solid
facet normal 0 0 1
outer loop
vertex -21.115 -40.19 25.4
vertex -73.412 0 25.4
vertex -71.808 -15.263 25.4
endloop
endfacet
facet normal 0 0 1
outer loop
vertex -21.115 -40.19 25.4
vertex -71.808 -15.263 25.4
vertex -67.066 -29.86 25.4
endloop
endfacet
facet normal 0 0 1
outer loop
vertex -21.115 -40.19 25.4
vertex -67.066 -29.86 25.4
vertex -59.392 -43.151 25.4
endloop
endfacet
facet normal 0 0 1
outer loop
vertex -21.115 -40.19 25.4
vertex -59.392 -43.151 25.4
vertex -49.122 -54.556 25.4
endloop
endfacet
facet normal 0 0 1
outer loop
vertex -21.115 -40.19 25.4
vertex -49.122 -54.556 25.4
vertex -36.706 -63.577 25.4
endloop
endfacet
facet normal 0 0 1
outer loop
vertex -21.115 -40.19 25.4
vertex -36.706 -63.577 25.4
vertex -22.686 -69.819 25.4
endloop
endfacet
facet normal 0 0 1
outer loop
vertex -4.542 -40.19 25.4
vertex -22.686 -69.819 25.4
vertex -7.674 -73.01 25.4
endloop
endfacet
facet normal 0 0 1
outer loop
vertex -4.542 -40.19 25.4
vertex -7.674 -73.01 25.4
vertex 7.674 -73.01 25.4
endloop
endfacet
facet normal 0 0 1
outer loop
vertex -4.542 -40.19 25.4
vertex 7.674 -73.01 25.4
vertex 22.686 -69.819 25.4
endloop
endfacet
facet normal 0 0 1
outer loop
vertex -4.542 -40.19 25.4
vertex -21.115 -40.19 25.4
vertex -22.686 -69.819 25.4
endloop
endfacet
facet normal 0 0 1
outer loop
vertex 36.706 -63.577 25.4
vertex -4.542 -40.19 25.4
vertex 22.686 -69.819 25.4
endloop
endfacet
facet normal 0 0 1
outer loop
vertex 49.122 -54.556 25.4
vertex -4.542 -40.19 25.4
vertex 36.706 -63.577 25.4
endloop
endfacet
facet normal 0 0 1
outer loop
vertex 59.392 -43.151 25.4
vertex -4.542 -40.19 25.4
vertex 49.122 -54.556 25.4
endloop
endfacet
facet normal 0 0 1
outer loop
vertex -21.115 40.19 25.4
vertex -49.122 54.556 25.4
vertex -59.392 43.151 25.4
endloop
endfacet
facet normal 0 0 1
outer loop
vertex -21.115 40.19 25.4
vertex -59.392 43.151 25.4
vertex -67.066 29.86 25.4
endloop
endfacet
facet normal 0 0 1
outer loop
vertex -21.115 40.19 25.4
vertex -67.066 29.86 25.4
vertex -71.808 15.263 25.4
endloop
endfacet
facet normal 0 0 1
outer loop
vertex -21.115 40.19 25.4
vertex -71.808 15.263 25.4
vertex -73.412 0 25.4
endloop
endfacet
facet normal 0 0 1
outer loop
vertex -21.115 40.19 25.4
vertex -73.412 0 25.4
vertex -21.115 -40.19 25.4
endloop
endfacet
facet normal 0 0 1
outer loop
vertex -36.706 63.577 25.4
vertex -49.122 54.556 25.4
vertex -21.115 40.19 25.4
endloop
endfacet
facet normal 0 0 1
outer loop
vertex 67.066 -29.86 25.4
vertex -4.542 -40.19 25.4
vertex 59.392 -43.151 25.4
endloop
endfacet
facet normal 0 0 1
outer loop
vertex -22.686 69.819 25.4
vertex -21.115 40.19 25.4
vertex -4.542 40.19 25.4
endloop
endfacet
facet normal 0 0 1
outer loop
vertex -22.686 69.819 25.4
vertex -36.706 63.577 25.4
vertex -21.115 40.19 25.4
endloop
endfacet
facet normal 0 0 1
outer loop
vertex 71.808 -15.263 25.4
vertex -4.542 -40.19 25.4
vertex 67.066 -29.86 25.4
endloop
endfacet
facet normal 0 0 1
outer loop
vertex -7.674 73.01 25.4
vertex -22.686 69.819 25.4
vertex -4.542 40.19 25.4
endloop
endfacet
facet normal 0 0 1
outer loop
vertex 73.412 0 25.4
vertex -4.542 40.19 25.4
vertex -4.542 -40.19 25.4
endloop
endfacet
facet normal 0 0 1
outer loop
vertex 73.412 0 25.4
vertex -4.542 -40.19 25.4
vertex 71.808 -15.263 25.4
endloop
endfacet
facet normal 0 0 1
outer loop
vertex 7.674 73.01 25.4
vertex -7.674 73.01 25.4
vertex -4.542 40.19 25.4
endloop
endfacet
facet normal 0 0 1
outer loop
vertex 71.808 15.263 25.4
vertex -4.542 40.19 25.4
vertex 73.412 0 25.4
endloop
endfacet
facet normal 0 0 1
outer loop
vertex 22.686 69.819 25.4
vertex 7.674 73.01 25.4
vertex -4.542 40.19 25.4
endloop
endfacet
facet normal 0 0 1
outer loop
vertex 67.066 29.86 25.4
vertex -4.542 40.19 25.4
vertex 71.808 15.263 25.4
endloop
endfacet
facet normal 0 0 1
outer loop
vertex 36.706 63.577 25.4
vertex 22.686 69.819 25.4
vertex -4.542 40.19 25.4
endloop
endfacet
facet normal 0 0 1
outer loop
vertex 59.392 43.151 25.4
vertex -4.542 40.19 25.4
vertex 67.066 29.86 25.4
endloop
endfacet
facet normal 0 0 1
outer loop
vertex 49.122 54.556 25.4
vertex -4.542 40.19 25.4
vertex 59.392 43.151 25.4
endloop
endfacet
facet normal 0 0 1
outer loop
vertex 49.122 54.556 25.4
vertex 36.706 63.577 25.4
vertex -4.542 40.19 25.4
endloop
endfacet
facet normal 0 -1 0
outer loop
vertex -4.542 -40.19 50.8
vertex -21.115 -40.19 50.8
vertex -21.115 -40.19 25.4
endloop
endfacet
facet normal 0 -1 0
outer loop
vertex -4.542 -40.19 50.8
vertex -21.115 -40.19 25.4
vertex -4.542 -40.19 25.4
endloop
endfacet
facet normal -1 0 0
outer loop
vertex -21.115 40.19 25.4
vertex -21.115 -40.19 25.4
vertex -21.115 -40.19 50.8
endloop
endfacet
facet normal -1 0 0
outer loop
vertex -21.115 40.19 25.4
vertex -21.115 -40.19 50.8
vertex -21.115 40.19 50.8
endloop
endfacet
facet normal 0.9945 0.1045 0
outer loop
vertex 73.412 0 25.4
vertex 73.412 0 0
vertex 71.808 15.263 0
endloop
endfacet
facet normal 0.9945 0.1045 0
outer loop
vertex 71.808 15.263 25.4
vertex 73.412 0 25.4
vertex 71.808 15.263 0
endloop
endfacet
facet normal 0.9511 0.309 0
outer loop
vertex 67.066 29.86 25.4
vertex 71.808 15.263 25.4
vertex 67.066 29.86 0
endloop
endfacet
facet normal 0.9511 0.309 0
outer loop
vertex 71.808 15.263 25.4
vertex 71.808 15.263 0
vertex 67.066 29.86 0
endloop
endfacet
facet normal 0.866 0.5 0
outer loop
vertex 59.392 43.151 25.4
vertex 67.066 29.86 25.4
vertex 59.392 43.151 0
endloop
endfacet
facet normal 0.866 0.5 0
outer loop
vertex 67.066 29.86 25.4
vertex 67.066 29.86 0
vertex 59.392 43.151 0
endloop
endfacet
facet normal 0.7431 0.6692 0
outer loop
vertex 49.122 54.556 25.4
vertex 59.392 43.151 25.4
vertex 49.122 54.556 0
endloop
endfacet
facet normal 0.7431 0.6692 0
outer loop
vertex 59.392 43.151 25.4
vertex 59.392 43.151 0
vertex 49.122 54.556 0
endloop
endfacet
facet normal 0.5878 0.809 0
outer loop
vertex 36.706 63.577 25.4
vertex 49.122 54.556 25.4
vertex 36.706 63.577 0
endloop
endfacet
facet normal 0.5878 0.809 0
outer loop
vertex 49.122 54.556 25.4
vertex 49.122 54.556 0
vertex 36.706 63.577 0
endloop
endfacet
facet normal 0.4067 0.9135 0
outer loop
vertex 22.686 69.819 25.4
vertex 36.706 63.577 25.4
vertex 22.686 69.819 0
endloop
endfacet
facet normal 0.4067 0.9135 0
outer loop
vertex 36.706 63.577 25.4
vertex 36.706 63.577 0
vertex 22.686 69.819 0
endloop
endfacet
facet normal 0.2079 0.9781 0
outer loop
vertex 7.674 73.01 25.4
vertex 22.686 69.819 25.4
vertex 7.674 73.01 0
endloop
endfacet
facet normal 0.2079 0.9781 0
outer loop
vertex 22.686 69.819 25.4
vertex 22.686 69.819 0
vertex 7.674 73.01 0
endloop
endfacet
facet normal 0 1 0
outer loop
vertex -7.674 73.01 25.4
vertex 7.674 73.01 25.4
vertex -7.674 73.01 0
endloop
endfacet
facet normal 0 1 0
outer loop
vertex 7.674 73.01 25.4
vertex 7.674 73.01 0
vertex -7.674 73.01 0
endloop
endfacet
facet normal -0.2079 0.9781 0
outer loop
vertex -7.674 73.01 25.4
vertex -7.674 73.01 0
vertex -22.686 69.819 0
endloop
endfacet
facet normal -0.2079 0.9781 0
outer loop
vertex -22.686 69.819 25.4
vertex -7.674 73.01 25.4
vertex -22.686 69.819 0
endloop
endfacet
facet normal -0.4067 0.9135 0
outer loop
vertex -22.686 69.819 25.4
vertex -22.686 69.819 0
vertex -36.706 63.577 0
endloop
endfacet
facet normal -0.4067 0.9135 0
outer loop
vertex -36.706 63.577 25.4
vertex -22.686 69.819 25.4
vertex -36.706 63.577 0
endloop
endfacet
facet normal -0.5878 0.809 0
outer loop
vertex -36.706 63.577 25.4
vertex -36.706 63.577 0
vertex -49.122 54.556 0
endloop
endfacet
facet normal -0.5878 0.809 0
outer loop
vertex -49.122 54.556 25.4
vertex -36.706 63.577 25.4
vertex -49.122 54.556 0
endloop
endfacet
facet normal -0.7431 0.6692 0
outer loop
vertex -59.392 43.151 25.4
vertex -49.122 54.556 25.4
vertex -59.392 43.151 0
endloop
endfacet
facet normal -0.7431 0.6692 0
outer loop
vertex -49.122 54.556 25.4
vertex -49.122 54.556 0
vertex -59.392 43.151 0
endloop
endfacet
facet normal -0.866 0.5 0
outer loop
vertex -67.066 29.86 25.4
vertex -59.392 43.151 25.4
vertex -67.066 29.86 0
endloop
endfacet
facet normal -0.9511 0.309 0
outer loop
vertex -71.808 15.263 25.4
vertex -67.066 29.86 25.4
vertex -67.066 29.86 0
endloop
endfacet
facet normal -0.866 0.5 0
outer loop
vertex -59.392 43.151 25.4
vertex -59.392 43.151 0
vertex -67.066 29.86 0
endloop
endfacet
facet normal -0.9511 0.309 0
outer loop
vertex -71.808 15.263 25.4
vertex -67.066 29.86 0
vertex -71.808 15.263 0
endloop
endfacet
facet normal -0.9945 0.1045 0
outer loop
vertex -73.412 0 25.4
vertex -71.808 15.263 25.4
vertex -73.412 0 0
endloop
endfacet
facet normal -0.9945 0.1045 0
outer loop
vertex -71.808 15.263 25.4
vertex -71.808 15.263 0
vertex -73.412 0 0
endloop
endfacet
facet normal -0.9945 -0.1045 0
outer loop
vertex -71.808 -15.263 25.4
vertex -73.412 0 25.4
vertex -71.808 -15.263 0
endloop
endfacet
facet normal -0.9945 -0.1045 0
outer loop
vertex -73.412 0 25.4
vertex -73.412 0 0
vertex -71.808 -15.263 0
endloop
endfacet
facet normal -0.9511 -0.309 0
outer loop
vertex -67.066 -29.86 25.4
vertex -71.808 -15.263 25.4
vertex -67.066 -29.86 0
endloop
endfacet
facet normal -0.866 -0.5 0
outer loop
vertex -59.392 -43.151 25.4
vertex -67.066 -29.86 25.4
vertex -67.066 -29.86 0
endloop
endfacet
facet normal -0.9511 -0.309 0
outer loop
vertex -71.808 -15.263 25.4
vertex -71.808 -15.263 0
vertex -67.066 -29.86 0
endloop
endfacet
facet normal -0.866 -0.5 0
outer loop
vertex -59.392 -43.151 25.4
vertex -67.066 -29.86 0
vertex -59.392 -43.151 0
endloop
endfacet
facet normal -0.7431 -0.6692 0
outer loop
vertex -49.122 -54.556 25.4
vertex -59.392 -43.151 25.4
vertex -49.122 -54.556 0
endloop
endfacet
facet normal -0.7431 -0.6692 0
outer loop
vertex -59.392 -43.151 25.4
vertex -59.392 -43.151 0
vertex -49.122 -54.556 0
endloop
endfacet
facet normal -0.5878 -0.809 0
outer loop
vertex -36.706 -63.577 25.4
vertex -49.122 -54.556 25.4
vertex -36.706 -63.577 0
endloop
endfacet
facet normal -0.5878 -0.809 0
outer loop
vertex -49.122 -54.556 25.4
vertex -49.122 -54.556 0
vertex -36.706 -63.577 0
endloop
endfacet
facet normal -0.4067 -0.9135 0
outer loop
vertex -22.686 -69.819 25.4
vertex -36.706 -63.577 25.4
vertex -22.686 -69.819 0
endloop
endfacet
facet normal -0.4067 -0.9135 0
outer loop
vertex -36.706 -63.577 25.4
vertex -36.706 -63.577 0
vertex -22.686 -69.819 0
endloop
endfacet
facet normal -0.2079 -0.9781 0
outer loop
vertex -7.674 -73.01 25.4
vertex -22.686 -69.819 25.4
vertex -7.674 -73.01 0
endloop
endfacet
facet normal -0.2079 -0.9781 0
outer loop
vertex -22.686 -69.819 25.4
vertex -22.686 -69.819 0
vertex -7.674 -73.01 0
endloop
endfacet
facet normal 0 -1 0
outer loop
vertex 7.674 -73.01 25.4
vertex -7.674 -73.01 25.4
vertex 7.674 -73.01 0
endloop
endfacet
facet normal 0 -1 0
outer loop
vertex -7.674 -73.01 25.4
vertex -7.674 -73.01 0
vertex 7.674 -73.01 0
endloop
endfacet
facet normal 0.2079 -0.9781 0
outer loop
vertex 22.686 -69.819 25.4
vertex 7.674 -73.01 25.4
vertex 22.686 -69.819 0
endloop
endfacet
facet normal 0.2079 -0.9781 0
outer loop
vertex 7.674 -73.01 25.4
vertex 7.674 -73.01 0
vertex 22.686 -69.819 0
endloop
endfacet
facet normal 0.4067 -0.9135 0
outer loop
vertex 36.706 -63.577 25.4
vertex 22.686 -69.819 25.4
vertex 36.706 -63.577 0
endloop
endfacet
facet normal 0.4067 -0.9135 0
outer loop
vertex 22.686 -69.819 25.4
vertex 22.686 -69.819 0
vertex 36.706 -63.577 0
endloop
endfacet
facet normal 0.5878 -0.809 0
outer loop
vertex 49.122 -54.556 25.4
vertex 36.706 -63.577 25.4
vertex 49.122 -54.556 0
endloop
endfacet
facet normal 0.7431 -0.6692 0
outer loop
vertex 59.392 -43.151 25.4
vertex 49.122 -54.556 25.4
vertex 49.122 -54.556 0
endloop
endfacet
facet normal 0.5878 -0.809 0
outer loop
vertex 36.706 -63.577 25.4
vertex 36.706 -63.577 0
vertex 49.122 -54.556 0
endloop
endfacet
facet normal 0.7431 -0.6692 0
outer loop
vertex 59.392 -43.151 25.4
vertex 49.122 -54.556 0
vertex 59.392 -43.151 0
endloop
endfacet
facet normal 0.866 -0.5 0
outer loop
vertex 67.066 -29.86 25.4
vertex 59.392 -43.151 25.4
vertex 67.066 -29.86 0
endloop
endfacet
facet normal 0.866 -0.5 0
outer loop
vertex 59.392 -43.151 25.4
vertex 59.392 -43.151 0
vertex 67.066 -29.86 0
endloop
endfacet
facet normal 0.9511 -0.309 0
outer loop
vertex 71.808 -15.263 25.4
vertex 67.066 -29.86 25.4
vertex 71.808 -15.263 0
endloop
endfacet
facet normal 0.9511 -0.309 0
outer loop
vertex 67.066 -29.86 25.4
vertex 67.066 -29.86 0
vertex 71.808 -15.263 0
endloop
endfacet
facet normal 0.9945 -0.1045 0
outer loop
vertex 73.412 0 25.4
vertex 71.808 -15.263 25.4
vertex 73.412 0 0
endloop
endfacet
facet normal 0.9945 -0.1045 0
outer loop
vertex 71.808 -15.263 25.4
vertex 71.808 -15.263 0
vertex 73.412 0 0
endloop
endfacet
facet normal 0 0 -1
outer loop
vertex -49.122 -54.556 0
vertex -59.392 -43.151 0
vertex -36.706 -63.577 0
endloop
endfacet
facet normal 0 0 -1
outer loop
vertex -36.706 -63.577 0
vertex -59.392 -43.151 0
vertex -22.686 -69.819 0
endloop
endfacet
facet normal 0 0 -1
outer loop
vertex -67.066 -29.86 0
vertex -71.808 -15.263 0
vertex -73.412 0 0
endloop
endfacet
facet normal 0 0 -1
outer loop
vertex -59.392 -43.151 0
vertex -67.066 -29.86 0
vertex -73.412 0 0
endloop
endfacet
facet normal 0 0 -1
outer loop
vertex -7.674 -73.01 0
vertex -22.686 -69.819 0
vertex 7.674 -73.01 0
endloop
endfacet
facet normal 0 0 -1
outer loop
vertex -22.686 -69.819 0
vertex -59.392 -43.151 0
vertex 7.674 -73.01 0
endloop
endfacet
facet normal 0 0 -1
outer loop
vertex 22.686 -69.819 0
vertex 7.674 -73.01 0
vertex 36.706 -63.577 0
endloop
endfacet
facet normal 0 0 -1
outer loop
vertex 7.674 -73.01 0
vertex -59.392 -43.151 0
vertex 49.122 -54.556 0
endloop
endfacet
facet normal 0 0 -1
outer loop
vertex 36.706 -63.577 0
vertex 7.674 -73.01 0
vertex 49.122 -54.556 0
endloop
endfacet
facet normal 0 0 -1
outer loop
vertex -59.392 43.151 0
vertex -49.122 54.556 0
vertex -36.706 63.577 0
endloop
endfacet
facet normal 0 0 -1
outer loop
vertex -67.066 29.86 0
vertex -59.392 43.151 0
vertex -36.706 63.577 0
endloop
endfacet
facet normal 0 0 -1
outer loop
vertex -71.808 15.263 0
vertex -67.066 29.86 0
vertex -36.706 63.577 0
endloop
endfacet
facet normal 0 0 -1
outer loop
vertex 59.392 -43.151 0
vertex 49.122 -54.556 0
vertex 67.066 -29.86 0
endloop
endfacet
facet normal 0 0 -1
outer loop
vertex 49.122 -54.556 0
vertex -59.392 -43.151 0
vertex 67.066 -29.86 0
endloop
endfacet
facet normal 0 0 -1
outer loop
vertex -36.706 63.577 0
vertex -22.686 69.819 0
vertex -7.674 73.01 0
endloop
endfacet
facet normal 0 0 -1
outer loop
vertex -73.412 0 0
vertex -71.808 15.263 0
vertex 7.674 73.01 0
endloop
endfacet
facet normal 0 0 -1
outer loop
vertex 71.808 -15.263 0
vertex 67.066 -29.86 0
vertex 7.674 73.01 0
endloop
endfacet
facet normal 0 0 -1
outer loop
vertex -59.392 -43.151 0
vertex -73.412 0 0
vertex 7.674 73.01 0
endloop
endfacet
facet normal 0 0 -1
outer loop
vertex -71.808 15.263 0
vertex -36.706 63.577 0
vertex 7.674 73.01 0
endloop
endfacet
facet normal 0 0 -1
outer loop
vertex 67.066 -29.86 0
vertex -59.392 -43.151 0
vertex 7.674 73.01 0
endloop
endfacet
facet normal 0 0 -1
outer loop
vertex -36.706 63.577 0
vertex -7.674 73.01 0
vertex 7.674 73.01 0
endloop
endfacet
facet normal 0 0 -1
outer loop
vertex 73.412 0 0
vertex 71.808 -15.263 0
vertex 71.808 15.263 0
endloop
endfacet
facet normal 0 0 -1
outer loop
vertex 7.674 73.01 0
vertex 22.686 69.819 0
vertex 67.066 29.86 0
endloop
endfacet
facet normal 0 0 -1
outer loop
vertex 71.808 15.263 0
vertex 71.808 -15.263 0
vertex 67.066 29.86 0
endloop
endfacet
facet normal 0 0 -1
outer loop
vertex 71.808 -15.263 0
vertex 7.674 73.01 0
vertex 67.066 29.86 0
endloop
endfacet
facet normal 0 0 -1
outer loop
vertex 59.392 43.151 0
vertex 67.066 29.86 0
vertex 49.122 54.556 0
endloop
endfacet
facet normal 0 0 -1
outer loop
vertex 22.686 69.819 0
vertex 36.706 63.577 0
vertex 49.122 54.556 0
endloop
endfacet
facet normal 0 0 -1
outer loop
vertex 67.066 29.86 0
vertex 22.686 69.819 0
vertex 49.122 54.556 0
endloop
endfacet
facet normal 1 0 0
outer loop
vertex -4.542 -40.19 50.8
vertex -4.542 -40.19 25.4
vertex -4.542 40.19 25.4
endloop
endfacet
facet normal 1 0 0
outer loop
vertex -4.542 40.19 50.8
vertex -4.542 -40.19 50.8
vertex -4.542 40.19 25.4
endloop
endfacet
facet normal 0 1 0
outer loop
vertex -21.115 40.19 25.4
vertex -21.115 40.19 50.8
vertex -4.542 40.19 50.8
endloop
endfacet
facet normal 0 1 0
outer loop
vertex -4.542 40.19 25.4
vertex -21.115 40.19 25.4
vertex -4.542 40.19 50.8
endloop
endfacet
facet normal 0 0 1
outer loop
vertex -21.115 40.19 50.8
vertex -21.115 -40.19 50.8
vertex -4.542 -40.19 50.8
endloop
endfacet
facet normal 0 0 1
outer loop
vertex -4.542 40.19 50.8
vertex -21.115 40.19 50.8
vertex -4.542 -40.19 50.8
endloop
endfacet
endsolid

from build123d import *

# Parameters (mm, degrees)
F0_R     = 73.412381
F1_DEPTH = 25.4
F2_W     = 16.572997
F2_H     = 80.379516
F3_DEPTH = 25.4


with BuildPart() as f1:
    # F0 (on Top) → F1 (new body)
    with BuildSketch(Plane.XY):
        Circle(F0_R)
    extrude(amount=F1_DEPTH)

    # F2 (on face) → F3 (join)
    with BuildSketch(Plane.XY.offset(25.4)):
        with Locations((-12.828204, 0)):
            Rectangle(F2_W, F2_H)
    extrude(amount=F3_DEPTH)


solid = f1.part
